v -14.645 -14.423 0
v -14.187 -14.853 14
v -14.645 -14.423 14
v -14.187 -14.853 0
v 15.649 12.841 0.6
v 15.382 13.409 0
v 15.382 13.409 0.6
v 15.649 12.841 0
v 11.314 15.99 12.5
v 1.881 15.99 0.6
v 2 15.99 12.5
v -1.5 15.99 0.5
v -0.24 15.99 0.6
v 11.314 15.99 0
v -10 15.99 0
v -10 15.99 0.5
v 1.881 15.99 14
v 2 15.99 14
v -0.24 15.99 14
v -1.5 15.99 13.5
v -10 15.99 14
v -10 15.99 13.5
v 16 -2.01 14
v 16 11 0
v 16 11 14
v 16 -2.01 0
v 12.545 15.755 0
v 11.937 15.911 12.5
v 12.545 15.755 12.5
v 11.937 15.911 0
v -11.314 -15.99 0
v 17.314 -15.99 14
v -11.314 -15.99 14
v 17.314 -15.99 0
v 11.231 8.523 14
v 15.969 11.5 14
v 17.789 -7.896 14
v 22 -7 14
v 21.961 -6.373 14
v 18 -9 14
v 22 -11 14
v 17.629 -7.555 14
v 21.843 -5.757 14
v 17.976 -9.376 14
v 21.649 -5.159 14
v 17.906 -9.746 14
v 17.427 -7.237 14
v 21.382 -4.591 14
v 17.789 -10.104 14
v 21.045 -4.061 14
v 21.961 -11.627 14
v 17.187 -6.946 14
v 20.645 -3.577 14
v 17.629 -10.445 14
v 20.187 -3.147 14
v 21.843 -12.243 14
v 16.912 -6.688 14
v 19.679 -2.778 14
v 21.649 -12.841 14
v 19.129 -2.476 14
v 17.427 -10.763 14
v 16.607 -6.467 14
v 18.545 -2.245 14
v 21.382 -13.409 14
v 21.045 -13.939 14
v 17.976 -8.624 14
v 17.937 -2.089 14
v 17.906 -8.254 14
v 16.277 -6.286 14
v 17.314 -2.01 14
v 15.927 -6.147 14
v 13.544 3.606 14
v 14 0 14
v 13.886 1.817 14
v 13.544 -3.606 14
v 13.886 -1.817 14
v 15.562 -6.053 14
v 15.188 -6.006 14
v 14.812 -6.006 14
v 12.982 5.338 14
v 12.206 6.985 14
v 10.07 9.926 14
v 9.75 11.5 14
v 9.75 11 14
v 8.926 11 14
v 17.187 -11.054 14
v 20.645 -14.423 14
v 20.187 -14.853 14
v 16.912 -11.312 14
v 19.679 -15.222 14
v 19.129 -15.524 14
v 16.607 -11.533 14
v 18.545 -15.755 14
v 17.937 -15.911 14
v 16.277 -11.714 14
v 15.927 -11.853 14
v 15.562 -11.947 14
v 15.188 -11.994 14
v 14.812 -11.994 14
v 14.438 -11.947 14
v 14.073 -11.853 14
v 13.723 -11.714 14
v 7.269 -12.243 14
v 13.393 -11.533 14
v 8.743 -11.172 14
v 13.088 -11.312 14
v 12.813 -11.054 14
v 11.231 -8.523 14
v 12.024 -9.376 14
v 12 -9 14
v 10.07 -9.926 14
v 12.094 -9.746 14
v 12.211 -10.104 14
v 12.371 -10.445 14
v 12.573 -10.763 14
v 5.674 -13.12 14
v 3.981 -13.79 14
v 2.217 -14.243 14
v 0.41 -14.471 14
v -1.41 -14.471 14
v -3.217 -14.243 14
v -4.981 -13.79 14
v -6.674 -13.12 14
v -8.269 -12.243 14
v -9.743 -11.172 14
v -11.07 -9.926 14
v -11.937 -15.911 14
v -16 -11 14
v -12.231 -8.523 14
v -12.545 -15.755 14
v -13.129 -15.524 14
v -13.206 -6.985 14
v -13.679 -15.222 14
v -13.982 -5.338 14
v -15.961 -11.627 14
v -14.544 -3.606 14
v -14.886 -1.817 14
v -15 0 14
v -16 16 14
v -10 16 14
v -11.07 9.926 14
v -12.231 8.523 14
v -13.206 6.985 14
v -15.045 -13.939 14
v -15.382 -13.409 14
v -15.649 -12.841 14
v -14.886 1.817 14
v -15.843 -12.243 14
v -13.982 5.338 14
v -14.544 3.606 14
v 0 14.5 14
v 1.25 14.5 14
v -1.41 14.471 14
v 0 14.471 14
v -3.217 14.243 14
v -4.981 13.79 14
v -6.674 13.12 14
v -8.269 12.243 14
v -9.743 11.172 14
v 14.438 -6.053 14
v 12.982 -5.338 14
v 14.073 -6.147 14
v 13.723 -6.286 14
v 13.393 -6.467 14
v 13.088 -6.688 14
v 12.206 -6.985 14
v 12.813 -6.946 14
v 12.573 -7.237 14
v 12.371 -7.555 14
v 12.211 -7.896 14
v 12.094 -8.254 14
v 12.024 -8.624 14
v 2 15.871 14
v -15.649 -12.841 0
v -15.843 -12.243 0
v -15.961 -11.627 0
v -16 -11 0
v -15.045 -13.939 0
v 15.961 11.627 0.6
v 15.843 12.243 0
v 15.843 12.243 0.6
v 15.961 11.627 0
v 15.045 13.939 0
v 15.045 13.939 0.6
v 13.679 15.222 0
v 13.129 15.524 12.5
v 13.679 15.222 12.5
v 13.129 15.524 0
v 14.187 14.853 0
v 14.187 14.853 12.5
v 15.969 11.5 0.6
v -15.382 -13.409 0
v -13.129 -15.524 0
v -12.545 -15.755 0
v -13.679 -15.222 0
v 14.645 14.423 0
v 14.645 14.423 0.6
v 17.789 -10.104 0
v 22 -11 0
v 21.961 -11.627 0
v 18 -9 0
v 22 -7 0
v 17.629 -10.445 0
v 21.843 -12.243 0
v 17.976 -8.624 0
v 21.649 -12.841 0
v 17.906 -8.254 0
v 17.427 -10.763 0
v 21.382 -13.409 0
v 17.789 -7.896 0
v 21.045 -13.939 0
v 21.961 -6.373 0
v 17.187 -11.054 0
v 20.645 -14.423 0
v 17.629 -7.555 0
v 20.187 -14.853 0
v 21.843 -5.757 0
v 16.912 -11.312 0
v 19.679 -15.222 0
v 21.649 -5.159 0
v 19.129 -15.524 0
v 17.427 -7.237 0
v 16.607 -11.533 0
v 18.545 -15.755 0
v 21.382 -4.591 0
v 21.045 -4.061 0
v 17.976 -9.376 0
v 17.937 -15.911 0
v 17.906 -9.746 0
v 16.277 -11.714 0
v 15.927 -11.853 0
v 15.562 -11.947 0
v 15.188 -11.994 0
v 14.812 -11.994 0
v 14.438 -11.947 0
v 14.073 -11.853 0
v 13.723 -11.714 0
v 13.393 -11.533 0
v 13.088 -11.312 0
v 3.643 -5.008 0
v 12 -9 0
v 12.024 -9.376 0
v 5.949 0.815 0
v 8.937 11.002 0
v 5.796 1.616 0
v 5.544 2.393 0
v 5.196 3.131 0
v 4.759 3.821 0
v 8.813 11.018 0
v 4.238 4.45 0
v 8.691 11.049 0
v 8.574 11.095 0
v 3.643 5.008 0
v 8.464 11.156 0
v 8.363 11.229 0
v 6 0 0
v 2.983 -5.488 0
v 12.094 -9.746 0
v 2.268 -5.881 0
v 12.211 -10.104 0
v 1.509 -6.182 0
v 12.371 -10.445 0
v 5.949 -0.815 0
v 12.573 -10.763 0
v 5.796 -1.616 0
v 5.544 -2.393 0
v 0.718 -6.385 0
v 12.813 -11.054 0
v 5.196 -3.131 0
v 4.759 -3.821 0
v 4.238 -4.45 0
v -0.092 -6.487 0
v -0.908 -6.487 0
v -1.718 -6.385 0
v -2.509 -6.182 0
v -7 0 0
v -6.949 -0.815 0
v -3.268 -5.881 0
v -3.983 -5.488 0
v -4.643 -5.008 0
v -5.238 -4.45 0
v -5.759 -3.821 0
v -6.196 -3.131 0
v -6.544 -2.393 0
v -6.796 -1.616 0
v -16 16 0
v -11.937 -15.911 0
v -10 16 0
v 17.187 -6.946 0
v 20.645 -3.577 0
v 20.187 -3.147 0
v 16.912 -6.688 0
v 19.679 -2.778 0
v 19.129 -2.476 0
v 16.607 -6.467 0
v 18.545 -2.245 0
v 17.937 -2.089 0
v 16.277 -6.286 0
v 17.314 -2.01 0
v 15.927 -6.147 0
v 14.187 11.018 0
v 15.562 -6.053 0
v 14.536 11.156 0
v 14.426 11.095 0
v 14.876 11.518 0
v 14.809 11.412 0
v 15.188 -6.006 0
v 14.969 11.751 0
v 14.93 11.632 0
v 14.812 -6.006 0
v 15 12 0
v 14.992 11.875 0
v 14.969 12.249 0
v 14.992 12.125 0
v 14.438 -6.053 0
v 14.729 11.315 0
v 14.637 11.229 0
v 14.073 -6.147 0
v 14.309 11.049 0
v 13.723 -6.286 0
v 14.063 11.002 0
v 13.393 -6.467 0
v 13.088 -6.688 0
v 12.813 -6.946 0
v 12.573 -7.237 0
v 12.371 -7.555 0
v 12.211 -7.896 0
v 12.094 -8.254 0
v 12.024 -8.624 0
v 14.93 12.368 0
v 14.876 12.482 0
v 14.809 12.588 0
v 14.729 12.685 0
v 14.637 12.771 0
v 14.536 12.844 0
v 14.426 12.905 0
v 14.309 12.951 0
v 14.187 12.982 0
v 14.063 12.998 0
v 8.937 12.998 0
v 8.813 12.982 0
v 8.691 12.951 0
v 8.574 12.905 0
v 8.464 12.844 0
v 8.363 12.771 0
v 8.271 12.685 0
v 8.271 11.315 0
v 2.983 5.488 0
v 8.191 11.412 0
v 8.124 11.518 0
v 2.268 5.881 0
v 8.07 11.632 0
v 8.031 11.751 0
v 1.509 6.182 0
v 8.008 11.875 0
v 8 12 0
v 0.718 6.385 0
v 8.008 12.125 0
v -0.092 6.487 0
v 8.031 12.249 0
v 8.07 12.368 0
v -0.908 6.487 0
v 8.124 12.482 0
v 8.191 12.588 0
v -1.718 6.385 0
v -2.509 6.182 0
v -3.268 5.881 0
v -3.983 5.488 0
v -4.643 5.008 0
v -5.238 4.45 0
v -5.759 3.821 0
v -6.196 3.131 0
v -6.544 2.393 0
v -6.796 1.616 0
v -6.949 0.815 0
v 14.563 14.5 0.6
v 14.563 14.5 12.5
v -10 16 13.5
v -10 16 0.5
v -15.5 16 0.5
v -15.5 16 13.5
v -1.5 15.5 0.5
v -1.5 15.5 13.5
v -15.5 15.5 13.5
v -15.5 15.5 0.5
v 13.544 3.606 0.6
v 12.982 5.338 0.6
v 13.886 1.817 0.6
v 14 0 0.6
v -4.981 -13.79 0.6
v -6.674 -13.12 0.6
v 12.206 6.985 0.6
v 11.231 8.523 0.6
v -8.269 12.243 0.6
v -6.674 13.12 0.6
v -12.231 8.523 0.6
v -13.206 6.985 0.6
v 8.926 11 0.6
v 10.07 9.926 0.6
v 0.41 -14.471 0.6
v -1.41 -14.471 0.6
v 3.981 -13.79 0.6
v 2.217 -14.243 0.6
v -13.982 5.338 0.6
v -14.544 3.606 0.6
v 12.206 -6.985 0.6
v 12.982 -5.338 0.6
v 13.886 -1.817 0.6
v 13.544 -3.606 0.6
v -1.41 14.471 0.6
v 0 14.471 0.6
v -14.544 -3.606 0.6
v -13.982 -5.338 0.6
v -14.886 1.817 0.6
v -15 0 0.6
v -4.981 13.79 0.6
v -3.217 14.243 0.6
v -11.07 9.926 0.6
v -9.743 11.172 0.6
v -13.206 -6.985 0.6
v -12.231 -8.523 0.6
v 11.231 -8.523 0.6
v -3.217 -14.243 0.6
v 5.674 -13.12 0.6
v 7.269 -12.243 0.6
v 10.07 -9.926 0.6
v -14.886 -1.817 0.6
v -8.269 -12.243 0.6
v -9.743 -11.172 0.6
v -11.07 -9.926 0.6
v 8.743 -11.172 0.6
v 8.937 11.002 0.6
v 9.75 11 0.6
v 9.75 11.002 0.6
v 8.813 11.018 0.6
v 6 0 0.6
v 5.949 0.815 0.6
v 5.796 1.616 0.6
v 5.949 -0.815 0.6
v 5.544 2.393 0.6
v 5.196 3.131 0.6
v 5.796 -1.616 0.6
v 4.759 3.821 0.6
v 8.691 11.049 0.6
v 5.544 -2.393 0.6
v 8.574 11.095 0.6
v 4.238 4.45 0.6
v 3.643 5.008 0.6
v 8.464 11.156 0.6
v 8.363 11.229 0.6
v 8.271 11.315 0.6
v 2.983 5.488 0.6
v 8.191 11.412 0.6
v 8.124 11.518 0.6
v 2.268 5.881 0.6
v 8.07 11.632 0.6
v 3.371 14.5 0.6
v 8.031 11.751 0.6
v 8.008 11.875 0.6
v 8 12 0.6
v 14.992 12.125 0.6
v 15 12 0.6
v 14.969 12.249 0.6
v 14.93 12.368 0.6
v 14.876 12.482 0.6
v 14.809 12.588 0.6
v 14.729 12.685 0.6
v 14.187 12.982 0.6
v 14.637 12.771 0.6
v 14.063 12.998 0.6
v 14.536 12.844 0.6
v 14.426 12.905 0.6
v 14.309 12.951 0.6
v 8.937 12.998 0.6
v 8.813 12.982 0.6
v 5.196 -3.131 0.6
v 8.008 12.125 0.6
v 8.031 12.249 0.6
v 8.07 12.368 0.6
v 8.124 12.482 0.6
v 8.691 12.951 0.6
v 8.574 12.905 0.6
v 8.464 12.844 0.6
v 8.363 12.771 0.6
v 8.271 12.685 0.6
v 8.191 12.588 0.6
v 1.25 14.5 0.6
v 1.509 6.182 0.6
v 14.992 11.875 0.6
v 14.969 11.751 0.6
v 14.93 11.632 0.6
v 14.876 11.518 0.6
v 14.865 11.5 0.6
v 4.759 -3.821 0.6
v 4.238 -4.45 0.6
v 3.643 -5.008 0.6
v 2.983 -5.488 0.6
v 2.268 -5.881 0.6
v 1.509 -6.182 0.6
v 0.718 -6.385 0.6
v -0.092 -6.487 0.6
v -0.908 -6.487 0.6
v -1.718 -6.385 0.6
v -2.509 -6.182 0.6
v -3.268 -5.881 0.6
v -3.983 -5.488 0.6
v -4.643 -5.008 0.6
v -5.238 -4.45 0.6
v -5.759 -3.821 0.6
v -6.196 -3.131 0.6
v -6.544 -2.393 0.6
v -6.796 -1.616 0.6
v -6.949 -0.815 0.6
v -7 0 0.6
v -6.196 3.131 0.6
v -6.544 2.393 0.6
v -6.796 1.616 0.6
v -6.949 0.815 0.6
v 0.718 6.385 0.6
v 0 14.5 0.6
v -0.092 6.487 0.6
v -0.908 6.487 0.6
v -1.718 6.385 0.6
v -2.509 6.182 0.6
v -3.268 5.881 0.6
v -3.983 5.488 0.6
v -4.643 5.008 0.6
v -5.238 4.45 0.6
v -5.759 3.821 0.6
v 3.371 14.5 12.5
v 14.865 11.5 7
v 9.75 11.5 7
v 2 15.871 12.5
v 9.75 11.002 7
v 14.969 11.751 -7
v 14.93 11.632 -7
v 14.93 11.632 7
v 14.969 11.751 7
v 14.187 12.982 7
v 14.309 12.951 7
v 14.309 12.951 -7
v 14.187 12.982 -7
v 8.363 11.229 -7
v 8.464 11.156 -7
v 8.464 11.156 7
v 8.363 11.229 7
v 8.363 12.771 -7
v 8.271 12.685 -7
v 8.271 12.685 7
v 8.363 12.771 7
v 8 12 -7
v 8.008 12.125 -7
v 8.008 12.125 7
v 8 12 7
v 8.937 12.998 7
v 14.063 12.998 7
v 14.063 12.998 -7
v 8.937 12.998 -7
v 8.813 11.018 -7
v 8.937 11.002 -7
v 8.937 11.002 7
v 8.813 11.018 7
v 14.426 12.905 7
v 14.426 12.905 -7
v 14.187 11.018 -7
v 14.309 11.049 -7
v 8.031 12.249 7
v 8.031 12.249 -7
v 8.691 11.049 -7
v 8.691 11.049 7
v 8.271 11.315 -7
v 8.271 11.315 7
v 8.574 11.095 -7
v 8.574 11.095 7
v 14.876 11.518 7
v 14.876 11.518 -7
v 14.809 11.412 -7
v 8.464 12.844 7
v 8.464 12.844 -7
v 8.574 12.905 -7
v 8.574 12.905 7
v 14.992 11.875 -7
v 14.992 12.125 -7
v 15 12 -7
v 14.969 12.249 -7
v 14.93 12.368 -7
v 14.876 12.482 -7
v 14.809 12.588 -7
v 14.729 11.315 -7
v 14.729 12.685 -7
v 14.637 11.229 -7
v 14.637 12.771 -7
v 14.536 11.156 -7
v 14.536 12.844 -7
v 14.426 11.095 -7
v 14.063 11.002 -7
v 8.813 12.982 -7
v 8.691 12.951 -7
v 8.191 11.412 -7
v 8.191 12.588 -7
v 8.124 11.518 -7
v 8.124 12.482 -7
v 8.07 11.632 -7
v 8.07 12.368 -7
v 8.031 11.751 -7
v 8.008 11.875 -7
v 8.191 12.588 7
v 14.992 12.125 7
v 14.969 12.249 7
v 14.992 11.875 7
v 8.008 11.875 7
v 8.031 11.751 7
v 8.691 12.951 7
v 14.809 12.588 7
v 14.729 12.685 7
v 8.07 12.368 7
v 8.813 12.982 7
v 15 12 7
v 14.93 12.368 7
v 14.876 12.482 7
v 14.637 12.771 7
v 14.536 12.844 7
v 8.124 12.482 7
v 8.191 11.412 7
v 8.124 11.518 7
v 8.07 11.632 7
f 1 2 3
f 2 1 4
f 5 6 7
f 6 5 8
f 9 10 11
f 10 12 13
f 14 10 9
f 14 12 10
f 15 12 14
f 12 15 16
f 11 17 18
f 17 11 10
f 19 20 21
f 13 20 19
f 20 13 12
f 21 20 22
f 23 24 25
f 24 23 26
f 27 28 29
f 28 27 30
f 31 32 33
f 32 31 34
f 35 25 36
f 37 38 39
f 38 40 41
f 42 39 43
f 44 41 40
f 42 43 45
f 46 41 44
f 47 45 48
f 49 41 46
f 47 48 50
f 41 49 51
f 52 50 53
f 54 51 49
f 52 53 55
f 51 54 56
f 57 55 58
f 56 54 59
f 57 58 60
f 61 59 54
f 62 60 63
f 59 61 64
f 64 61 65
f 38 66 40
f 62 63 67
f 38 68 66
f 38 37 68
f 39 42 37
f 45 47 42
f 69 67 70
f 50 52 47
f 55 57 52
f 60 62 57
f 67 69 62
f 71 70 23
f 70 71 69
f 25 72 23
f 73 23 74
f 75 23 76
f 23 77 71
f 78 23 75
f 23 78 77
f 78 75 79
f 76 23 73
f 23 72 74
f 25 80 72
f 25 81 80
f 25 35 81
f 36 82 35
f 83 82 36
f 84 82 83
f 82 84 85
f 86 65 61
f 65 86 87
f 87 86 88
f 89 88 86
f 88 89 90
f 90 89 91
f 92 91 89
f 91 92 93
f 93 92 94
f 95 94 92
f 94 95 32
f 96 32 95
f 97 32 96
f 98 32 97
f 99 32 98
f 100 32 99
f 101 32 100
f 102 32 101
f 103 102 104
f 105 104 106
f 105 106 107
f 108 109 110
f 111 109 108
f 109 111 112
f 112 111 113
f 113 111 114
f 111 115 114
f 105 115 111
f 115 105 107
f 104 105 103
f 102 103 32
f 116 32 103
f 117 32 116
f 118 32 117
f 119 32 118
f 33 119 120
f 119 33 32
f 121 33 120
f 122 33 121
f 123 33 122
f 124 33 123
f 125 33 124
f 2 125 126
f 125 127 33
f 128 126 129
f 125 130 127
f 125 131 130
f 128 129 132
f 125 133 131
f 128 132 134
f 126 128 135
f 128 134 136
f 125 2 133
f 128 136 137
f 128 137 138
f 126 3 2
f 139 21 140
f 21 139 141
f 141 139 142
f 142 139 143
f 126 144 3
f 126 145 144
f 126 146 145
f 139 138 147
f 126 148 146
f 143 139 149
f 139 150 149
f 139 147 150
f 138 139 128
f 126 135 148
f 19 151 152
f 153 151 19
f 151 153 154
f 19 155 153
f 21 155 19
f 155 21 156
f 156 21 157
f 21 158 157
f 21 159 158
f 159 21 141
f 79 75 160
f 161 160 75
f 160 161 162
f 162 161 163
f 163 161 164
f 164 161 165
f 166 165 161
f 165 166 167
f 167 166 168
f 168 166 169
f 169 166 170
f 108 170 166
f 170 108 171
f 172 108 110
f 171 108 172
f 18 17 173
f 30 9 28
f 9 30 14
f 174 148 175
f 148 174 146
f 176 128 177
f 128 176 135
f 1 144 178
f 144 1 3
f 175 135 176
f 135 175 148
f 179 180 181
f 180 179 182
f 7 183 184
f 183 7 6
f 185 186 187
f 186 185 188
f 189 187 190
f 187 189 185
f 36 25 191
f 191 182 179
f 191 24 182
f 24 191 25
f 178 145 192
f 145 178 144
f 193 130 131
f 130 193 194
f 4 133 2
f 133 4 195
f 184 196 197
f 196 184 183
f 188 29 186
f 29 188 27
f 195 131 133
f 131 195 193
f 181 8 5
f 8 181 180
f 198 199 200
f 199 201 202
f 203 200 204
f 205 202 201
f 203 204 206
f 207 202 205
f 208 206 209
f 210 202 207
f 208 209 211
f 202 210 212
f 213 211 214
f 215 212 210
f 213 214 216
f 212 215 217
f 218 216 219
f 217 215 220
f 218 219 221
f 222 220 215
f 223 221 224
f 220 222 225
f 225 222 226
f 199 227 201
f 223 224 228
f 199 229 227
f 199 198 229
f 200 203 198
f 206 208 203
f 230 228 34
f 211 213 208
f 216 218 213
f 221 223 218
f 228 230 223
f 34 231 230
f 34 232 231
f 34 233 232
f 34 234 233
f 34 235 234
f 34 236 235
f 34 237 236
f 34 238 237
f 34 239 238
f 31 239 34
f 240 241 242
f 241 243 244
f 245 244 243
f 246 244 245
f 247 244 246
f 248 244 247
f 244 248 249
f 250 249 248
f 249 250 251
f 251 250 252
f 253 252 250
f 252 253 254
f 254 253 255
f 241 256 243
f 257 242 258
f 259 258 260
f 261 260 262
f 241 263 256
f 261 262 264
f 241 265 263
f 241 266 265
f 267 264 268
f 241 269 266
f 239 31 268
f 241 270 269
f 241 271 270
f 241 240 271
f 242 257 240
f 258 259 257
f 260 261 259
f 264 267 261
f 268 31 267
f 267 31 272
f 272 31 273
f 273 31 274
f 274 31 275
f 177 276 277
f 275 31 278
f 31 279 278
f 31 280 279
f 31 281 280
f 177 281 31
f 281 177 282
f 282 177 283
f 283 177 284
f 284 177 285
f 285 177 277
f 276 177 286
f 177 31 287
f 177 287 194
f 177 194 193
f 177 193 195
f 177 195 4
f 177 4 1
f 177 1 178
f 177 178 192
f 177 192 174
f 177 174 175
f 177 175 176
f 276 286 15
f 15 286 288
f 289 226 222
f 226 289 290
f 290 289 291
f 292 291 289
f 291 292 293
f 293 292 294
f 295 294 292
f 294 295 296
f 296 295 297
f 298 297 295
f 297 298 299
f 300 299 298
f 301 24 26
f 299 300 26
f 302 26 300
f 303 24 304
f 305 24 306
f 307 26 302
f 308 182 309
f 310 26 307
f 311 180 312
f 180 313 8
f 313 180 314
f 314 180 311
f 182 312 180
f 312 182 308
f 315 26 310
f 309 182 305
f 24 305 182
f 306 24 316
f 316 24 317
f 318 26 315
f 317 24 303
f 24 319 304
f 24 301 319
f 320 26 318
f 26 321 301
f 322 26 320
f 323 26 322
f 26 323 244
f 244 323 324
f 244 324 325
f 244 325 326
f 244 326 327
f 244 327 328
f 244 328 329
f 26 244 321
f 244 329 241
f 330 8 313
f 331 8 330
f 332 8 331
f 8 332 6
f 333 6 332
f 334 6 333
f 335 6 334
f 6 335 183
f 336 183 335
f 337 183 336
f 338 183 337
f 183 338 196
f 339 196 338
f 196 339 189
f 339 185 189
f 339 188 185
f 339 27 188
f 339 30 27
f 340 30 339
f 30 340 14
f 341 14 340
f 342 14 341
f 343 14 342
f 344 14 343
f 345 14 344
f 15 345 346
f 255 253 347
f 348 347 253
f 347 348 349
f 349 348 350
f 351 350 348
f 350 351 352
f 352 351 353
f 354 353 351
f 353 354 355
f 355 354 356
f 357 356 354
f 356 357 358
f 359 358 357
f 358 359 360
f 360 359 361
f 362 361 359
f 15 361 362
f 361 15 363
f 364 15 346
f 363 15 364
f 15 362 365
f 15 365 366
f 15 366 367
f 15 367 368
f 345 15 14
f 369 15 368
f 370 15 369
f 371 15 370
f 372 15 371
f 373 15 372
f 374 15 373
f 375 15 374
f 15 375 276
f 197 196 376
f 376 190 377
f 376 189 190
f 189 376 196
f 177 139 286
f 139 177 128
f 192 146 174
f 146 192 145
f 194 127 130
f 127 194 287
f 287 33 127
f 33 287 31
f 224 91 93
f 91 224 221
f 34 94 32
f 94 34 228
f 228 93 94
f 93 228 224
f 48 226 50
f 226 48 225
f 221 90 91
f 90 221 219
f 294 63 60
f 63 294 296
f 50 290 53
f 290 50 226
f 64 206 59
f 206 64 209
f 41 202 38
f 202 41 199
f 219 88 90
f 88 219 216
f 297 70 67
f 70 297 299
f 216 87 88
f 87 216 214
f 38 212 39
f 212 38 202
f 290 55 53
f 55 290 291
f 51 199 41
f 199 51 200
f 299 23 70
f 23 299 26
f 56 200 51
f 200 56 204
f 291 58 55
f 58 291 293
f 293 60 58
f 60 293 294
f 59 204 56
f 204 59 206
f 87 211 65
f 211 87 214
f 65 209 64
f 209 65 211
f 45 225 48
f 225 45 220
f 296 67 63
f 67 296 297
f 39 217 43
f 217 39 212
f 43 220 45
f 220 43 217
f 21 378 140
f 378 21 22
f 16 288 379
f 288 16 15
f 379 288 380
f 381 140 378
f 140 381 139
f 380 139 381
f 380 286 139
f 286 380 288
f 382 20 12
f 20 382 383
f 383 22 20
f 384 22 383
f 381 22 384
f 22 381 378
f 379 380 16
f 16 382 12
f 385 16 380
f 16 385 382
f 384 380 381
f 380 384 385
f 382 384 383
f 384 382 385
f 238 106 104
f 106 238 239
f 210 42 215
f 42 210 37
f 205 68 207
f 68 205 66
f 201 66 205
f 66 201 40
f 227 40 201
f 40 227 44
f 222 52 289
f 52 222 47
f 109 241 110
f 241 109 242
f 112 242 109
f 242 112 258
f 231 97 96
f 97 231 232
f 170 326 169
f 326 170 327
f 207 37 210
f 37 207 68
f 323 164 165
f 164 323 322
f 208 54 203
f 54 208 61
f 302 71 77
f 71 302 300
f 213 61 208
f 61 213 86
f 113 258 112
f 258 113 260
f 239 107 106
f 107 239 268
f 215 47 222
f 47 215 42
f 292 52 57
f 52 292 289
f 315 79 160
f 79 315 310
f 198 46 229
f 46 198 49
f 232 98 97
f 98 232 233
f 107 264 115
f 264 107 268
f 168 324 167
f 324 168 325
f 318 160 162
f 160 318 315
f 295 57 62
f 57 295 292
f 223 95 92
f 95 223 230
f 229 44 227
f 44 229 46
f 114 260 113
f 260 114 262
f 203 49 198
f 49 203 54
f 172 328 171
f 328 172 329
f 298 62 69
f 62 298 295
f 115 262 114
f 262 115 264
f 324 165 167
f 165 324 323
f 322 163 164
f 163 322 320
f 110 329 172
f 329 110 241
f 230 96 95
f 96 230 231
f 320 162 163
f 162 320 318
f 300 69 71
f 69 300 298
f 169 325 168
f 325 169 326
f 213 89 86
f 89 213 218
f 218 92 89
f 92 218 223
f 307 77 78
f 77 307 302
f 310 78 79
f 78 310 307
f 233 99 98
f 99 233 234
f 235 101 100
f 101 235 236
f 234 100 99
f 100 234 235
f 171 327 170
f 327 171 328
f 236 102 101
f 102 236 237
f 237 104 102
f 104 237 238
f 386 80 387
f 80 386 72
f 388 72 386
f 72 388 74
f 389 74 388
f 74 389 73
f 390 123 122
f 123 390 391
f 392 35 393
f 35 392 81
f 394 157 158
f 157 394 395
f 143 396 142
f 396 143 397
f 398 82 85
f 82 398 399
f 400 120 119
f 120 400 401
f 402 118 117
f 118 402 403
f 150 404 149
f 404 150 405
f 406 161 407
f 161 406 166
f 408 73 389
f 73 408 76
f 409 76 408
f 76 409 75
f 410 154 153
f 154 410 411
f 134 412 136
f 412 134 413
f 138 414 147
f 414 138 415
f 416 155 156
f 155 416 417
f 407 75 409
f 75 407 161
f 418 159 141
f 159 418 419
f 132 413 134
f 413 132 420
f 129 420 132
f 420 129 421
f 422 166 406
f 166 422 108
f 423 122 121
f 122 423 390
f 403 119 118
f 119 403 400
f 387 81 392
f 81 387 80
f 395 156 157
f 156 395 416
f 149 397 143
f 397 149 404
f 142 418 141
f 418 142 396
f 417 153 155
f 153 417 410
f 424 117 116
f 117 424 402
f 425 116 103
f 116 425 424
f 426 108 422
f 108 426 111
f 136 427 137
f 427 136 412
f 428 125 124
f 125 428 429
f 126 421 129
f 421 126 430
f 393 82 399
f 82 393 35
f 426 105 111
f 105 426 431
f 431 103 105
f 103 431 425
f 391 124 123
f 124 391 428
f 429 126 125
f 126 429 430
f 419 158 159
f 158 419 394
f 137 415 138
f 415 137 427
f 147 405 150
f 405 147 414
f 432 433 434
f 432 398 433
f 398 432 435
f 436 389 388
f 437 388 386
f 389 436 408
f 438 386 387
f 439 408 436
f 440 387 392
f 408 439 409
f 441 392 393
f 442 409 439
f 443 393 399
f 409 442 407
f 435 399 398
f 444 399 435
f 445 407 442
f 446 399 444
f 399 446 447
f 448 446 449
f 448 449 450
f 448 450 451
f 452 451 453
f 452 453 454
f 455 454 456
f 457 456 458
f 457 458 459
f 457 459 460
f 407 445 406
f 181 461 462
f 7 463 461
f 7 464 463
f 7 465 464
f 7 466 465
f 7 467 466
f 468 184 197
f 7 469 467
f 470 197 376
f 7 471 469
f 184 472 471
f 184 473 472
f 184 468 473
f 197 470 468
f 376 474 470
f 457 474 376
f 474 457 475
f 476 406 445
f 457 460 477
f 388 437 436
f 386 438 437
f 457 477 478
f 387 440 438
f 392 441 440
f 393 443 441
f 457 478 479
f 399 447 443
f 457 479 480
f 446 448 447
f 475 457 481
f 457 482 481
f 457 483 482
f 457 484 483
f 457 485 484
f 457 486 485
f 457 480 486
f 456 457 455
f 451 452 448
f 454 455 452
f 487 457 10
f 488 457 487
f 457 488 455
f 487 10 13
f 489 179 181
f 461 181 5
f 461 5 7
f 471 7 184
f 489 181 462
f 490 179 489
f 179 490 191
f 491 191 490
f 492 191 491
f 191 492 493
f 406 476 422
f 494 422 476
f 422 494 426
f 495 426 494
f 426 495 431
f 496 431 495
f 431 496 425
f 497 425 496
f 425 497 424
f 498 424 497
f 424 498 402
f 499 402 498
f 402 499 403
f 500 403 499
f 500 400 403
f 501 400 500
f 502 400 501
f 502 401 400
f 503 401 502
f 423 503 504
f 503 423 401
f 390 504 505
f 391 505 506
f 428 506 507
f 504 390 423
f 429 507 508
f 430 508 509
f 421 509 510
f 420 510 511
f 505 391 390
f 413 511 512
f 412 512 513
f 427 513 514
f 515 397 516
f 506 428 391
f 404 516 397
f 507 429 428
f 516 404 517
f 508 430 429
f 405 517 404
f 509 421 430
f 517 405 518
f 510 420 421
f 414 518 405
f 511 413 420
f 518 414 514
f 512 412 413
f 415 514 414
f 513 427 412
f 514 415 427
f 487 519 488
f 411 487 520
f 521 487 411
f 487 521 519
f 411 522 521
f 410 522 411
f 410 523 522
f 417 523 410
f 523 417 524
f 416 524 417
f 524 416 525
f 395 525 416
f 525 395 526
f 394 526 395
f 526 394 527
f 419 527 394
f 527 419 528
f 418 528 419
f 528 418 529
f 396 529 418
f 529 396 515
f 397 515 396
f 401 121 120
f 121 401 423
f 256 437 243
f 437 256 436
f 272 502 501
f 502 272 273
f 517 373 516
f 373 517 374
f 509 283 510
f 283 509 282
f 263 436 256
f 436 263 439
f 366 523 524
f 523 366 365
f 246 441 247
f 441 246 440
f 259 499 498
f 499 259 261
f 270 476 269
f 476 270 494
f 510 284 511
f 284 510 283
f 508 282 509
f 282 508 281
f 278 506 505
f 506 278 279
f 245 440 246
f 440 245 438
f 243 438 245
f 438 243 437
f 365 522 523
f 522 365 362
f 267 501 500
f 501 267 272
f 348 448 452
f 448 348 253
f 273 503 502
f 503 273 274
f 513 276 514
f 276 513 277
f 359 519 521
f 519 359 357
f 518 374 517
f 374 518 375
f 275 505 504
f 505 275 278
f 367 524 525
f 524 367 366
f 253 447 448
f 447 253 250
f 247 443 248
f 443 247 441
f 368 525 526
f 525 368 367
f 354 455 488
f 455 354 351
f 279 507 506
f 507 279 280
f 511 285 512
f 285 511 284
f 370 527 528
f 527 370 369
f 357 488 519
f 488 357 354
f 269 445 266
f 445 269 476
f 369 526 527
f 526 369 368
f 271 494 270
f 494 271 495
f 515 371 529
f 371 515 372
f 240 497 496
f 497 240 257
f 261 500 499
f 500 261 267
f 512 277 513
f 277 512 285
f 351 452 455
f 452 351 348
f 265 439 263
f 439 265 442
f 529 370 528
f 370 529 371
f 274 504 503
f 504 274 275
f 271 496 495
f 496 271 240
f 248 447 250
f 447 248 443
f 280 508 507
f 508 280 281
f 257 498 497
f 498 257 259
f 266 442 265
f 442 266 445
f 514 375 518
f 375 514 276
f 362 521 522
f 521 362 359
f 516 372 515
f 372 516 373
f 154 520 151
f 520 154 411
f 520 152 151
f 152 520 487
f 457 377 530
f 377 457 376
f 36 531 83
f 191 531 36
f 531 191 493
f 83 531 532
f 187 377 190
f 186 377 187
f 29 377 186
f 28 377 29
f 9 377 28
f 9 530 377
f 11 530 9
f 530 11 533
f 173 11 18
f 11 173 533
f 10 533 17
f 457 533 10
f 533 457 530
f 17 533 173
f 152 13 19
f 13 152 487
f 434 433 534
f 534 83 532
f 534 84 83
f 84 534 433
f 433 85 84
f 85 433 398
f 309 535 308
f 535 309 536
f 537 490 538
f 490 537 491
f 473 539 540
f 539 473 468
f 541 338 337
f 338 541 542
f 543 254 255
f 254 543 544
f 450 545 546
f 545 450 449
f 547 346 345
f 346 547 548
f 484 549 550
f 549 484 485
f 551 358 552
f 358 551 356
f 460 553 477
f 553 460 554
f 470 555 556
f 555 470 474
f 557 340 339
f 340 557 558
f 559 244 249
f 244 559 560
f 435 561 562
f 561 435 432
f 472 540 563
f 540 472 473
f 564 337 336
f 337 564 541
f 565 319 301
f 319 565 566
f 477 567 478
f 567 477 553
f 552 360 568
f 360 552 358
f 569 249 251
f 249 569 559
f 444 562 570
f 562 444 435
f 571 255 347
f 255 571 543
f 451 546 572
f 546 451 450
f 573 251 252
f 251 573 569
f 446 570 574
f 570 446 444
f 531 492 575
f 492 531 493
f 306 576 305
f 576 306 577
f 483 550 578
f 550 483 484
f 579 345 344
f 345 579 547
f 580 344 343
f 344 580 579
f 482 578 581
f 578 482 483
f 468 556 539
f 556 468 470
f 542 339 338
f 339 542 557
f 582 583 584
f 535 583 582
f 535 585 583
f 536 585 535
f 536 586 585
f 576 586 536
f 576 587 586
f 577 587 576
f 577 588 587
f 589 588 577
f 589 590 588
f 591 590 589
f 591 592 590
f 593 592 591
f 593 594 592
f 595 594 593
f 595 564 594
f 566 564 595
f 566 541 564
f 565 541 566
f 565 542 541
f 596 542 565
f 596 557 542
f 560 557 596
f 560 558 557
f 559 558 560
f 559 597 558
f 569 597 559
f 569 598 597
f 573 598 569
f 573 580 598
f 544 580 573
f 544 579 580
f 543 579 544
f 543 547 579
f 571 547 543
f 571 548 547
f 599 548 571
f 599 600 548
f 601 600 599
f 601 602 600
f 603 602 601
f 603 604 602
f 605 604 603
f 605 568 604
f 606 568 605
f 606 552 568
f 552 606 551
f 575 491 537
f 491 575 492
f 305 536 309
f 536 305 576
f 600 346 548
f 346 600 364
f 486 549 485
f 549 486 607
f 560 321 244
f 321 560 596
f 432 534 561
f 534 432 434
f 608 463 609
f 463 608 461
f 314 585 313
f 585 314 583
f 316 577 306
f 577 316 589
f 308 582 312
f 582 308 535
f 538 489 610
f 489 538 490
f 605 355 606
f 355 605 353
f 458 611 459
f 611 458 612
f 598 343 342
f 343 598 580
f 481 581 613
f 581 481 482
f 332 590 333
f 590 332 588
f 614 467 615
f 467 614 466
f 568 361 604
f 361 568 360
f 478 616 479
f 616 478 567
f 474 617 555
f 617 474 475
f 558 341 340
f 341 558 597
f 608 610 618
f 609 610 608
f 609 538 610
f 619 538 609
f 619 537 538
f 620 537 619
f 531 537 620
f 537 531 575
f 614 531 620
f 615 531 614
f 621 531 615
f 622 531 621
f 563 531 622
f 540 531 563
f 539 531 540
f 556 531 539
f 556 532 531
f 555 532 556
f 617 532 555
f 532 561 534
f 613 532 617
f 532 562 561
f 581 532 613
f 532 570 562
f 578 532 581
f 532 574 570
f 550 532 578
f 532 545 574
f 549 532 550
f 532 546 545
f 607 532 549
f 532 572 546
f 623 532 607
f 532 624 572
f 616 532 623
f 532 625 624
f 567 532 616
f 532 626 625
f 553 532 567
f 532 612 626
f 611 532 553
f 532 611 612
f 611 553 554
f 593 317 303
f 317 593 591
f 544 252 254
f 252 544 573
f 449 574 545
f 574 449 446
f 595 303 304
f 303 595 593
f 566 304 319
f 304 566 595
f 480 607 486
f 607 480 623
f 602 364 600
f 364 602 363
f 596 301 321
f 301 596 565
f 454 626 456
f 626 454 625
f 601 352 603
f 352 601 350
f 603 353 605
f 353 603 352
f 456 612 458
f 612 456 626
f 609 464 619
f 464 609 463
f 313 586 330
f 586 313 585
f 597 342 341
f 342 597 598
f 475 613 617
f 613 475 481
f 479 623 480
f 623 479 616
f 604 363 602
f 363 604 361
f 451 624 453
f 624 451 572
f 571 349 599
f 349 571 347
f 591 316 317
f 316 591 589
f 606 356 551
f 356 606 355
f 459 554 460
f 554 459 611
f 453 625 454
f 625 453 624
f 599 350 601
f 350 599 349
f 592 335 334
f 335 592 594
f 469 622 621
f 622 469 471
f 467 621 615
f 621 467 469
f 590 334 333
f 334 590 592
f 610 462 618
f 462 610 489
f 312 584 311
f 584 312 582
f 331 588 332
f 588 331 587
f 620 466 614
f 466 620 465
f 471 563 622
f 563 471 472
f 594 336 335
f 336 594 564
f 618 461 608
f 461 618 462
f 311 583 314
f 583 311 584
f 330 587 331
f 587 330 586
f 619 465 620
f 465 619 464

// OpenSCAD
$fn = 50;


union() {
	difference() {
		union() {
			hull() {
				translate(v = [-11.0000000000, 11.0000000000, 0]) {
					cylinder(h = 14, r = 5);
				}
				translate(v = [11.0000000000, 11.0000000000, 0]) {
					cylinder(h = 14, r = 5);
				}
				translate(v = [-11.0000000000, -11.0000000000, 0]) {
					cylinder(h = 14, r = 5);
				}
				translate(v = [11.0000000000, -11.0000000000, 0]) {
					cylinder(h = 14, r = 5);
				}
			}
			translate(v = [7.5000000000, -9.0000000000, 0]) {
				hull() {
					translate(v = [-9.5000000000, 2.0000000000, 0]) {
						cylinder(h = 14, r = 5);
					}
					translate(v = [9.5000000000, 2.0000000000, 0]) {
						cylinder(h = 14, r = 5);
					}
					translate(v = [-9.5000000000, -2.0000000000, 0]) {
						cylinder(h = 14, r = 5);
					}
					translate(v = [9.5000000000, -2.0000000000, 0]) {
						cylinder(h = 14, r = 5);
					}
				}
			}
			translate(v = [-16.0000000000, 10.0000000000, 0]) {
				cube(size = [6, 6, 14]);
			}
		}
		union() {
			translate(v = [-15.5000000000, 15.5000000000, 0.5000000000]) {
				cube(size = [14, 0.5000000000, 13.0000000000]);
			}
			translate(v = [15.0000000000, -9.0000000000, -100.0000000000]) {
				cylinder(h = 200, r = 3.0000000000);
			}
			translate(v = [-0.5000000000, 0.0000000000, 0.6000000000]) {
				cylinder(h = 16.4000000000, r = 14.5000000000);
			}
			translate(v = [-0.5000000000, 0.0000000000, -7.0000000000]) {
				cylinder(h = 14, r = 6.5000000000);
			}
			translate(v = [0.0000000000, 11.5000000000, 0.6000000000]) {
				cube(size = [16.0000000000, 3, 16.4000000000]);
			}
			translate(v = [2.0000000000, 11.5000000000, 12.5000000000]) {
				cube(size = [14.0000000000, 6, 1.5000000000]);
			}
			translate(v = [-3.0000000000, 18.7500000000, 0.6000000000]) {
				rotate(a = [0, 0, -45]) {
					cube(size = [10, 1.5000000000, 16.4000000000]);
				}
			}
			translate(v = [2.2500000000, 11.0000000000, 0.6000000000]) {
				cube(size = [7.5000000000, 2, 13.4000000000]);
			}
		}
	}
	union() {
		translate(v = [11.5000000000, 12, -7.0000000000]) {
			rotate(a = [0, 0, 0]) {
				difference() {
					union() {
						hull() {
							translate(v = [2.5000000000, 0, 0]) {
								cylinder(h = 14, r = 1.0000000000, r1 = 1.0000000000, r2 = 1.0000000000);
							}
							translate(v = [-2.5000000000, 0, 0]) {
								cylinder(h = 14, r = 1.0000000000, r1 = 1.0000000000, r2 = 1.0000000000);
							}
						}
					}
					union();
				}
			}
		}
	}
}
